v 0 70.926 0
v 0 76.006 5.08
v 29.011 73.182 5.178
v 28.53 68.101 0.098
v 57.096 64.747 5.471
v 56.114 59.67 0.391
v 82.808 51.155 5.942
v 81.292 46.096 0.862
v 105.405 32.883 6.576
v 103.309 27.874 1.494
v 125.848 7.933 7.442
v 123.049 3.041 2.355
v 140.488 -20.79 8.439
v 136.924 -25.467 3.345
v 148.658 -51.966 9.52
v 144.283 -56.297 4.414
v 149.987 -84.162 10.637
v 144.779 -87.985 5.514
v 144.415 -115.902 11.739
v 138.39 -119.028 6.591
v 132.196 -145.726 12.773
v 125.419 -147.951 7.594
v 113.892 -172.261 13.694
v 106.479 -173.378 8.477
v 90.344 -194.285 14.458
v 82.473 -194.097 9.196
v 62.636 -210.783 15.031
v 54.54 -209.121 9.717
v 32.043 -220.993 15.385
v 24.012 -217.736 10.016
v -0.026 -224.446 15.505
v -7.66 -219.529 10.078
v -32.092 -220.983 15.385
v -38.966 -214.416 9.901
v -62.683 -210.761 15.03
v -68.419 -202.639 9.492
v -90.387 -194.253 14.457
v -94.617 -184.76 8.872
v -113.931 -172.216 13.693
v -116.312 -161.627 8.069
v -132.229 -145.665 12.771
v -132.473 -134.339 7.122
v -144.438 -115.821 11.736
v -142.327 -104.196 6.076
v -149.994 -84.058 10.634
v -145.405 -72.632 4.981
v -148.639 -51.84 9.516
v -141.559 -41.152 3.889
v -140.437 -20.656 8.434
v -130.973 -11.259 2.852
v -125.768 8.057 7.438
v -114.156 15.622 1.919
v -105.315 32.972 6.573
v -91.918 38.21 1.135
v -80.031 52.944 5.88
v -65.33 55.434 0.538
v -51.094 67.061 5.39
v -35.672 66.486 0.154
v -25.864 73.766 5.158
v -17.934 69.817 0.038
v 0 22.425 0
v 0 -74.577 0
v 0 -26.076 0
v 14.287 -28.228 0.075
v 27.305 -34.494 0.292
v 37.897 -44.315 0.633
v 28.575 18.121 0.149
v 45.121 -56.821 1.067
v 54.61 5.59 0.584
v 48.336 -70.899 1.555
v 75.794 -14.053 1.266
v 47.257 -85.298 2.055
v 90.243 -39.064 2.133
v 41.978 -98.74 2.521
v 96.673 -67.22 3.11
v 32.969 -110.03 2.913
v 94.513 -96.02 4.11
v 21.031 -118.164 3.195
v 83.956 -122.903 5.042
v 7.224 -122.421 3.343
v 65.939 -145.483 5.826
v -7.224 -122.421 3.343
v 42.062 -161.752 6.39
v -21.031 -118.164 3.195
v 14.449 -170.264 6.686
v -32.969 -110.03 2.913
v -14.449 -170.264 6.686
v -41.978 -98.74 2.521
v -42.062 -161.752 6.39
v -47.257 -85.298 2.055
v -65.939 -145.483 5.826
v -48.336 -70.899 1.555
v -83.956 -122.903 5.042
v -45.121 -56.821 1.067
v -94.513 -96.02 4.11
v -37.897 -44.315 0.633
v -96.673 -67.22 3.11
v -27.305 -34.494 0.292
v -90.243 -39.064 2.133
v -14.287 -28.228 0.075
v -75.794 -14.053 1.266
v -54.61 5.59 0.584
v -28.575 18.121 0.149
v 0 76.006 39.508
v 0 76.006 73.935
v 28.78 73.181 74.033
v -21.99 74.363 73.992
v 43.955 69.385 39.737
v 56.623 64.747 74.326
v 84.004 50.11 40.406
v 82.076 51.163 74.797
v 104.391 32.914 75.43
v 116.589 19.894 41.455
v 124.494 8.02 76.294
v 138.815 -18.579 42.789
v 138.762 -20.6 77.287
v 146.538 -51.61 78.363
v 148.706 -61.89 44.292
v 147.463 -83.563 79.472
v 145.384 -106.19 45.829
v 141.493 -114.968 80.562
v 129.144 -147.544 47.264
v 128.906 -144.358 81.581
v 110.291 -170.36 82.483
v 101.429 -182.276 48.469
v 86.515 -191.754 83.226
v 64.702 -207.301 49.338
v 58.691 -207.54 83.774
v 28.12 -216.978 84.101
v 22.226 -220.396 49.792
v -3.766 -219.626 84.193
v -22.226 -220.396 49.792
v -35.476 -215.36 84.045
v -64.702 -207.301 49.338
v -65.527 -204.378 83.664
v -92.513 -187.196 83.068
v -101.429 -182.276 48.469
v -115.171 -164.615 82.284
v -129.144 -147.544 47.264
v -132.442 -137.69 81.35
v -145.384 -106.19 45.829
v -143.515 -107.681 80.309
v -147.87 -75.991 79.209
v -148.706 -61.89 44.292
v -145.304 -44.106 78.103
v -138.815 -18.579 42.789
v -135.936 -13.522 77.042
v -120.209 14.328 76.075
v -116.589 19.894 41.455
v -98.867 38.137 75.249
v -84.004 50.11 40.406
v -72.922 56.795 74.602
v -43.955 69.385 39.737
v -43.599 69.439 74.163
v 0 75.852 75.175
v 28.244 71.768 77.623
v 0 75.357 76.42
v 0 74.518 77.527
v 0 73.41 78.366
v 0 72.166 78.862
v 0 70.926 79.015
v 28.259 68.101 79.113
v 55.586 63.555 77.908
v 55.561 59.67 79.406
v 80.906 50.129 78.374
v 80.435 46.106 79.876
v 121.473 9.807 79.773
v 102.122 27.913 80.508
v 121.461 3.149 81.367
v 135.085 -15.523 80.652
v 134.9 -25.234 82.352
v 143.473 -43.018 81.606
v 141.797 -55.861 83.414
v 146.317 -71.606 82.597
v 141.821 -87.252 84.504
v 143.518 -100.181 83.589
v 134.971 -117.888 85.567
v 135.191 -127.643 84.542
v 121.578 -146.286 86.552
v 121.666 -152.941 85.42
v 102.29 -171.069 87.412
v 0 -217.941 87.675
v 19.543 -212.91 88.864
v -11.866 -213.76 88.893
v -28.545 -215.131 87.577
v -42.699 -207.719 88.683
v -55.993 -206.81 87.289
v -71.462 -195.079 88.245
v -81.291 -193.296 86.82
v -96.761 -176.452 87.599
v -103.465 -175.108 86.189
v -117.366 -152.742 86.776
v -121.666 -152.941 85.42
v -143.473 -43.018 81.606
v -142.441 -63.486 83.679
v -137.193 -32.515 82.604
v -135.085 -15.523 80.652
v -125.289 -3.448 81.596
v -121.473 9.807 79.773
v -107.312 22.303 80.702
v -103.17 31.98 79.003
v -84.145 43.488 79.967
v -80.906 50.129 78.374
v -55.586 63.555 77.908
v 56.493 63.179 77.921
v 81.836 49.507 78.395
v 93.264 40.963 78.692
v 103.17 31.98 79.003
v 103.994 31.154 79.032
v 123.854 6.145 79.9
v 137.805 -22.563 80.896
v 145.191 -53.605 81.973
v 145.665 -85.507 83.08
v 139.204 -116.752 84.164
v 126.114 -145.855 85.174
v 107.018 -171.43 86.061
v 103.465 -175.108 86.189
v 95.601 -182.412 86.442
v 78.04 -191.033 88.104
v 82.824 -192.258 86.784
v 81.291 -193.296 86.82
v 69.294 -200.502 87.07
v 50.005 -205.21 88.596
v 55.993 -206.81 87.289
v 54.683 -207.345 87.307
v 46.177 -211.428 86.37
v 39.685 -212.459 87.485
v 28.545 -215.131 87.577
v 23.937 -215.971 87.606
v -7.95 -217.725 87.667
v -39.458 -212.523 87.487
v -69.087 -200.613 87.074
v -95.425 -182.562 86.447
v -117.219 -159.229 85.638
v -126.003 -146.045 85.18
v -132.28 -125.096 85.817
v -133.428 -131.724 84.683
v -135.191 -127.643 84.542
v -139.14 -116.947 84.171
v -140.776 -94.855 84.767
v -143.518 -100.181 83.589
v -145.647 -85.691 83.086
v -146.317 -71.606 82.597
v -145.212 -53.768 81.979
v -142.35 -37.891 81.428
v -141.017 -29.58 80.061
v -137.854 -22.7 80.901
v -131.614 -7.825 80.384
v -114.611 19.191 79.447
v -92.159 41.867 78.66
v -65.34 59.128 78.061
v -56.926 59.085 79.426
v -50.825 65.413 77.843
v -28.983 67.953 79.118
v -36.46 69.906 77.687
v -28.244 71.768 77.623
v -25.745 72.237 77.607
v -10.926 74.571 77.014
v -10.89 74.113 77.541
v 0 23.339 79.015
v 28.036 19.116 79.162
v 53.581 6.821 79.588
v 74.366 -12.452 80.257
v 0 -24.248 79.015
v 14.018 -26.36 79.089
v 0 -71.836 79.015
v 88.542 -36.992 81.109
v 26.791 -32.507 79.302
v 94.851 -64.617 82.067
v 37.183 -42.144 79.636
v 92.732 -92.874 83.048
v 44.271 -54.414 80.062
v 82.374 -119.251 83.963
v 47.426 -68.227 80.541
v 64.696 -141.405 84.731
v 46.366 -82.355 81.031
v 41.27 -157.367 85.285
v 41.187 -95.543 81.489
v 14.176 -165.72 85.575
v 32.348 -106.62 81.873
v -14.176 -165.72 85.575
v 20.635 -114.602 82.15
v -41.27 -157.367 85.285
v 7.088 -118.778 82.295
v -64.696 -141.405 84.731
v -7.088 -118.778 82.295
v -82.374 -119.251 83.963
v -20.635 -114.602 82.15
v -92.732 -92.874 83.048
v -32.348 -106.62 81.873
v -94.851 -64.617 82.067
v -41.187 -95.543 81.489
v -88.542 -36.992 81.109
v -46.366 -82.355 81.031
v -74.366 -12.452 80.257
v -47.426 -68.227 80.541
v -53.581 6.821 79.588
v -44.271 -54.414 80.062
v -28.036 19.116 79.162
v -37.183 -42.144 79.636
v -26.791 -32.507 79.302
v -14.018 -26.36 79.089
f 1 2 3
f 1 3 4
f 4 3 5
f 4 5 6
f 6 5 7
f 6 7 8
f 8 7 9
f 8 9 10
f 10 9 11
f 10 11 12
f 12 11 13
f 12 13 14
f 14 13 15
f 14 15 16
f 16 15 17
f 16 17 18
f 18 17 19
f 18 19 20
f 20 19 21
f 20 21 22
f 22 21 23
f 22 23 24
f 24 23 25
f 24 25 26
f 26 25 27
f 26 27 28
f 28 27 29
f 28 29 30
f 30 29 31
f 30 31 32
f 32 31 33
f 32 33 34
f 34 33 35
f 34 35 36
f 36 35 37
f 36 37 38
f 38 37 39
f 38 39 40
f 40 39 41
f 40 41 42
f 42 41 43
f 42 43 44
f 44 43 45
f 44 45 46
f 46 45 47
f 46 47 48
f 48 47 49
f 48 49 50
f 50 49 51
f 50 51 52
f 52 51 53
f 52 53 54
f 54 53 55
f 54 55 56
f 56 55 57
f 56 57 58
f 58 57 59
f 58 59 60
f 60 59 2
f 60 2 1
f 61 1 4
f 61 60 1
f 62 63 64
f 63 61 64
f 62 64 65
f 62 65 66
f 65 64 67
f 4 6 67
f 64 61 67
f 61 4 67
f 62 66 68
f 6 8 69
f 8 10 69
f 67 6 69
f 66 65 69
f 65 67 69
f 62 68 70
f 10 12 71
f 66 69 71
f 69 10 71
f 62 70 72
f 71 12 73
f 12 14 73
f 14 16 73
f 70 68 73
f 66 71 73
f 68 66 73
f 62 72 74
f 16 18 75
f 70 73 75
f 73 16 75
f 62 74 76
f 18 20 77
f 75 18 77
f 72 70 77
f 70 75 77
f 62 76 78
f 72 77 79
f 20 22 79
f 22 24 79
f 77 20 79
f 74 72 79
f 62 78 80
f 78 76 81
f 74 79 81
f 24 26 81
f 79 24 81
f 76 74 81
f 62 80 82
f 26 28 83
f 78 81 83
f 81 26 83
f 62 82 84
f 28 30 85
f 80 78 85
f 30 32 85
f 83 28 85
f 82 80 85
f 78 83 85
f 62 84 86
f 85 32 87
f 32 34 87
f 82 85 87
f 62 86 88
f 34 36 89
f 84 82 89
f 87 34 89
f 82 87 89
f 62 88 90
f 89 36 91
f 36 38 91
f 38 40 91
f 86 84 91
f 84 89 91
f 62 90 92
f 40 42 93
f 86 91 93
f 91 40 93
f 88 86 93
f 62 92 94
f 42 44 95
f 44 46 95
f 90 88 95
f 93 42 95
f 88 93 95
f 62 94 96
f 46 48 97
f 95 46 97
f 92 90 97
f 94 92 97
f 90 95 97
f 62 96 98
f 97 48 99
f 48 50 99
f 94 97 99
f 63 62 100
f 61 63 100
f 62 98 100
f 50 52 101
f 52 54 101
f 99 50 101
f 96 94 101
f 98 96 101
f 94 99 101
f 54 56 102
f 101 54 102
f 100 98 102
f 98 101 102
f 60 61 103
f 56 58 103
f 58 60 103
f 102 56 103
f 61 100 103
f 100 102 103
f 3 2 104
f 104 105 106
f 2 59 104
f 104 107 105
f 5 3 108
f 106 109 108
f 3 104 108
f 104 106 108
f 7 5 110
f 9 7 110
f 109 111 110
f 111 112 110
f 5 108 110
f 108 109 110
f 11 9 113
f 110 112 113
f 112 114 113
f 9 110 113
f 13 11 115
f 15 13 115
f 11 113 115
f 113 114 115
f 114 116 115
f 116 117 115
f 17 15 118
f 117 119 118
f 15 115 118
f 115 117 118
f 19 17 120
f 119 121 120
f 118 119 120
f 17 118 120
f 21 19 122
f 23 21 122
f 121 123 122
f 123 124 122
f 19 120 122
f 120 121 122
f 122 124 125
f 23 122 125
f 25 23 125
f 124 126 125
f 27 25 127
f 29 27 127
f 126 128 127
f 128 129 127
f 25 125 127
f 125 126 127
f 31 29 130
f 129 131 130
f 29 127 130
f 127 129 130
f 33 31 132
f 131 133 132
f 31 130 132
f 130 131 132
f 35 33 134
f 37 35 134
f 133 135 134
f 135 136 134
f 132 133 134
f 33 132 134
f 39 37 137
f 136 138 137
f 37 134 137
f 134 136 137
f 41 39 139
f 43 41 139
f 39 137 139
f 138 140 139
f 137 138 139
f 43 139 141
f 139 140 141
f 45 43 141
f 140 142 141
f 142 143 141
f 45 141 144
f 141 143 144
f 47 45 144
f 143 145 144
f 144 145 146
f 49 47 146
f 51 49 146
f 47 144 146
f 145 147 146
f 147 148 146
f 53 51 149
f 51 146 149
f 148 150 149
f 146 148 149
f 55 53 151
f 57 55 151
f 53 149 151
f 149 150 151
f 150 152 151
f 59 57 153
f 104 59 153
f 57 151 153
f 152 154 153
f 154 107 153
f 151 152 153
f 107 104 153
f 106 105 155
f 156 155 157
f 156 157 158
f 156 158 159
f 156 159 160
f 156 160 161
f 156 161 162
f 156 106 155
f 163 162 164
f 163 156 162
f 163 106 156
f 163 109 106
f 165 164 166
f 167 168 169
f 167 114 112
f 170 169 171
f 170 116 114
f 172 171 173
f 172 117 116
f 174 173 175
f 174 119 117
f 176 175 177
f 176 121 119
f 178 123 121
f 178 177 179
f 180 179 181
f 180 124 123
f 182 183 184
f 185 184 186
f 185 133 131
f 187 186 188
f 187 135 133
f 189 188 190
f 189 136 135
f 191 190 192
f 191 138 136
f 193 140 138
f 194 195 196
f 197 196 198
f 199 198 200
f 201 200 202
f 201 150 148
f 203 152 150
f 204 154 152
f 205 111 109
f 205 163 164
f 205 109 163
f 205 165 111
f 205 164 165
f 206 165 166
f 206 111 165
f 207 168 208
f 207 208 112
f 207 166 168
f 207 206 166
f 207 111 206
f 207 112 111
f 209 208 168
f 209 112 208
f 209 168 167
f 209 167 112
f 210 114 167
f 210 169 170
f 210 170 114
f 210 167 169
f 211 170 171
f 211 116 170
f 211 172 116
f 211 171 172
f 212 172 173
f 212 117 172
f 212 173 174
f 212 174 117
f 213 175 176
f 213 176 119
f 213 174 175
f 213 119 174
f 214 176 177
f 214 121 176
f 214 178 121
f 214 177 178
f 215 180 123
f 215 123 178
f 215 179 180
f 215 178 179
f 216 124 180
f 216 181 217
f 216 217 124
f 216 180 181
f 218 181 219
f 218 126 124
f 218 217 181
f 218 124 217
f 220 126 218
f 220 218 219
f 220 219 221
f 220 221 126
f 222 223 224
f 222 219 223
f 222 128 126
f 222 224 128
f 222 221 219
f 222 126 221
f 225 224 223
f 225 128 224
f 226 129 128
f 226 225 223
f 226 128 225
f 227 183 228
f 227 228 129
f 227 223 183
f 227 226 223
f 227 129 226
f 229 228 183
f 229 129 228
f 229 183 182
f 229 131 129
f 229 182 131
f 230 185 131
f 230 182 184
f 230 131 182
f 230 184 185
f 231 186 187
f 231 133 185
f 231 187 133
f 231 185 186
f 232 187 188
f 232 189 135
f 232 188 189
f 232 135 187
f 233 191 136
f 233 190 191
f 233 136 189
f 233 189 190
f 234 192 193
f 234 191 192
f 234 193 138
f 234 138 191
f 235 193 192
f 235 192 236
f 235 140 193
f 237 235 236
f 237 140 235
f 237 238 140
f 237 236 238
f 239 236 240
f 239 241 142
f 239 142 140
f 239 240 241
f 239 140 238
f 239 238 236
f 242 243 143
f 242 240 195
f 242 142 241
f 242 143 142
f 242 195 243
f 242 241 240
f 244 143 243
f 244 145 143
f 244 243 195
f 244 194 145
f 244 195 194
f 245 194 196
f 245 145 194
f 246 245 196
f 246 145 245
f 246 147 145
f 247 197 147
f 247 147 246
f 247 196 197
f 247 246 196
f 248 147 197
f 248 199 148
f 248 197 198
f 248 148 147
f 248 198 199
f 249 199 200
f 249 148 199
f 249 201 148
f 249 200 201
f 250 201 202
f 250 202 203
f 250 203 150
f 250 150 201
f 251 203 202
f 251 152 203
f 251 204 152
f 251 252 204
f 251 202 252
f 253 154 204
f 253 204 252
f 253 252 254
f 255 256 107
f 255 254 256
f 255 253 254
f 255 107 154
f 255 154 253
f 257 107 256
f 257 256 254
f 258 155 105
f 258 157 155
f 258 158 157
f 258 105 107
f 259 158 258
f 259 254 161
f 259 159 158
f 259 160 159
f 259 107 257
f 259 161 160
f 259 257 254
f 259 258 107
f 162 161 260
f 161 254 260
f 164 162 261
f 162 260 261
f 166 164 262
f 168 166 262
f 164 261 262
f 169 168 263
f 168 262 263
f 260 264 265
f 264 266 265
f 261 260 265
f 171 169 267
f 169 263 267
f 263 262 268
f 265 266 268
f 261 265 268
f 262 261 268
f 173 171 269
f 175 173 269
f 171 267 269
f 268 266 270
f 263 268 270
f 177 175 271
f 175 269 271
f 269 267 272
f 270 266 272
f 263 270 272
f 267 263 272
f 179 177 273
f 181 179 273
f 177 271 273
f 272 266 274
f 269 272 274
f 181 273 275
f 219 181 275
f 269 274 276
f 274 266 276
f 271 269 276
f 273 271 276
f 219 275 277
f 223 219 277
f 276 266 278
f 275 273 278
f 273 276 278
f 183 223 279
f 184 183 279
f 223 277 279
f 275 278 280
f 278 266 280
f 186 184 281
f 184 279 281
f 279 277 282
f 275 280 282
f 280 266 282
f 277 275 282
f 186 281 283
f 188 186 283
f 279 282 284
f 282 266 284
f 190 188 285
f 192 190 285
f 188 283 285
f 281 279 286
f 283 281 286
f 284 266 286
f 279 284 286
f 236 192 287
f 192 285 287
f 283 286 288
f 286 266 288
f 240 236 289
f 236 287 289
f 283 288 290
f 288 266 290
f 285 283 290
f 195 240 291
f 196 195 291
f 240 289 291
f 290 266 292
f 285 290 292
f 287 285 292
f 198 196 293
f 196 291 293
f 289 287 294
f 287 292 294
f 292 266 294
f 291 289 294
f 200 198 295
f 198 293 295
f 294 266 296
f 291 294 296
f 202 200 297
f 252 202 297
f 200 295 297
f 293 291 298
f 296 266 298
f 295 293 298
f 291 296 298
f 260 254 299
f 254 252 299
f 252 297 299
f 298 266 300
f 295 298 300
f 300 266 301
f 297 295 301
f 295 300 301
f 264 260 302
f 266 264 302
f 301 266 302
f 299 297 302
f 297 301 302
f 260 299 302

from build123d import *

# Parameters (mm, degrees)
F2_R    = 5.08
F3_SIZE = 5.08


with BuildPart() as f1:
    # F0 (on Right) → F1 (revolve)
    with BuildSketch(Plane.YZ):
        Polygon((-71.8356743455, 79.0152773261), (-74.5772719383, 0), (76.0060697794, 0), (76.0060697794, 79.0152773261), align=None)
    revolve(axis=Axis((0, -73.2064731419, 39.5076386631), (0, -0.0346761903, -0.9993986001)))

    # F2
    f2_edges = [f1.edges().sort_by_distance(p)[0] for p in [
        (0, -219.321877, 89.262288),
    ]]
    fillet(f2_edges, radius=F2_R)

    # F3
    f3_edges = [f1.edges().sort_by_distance(p)[0] for p in [
        (0, -224.798479, 10.437033),
    ]]
    chamfer(f3_edges, length=F3_SIZE)


solid = f1.part
